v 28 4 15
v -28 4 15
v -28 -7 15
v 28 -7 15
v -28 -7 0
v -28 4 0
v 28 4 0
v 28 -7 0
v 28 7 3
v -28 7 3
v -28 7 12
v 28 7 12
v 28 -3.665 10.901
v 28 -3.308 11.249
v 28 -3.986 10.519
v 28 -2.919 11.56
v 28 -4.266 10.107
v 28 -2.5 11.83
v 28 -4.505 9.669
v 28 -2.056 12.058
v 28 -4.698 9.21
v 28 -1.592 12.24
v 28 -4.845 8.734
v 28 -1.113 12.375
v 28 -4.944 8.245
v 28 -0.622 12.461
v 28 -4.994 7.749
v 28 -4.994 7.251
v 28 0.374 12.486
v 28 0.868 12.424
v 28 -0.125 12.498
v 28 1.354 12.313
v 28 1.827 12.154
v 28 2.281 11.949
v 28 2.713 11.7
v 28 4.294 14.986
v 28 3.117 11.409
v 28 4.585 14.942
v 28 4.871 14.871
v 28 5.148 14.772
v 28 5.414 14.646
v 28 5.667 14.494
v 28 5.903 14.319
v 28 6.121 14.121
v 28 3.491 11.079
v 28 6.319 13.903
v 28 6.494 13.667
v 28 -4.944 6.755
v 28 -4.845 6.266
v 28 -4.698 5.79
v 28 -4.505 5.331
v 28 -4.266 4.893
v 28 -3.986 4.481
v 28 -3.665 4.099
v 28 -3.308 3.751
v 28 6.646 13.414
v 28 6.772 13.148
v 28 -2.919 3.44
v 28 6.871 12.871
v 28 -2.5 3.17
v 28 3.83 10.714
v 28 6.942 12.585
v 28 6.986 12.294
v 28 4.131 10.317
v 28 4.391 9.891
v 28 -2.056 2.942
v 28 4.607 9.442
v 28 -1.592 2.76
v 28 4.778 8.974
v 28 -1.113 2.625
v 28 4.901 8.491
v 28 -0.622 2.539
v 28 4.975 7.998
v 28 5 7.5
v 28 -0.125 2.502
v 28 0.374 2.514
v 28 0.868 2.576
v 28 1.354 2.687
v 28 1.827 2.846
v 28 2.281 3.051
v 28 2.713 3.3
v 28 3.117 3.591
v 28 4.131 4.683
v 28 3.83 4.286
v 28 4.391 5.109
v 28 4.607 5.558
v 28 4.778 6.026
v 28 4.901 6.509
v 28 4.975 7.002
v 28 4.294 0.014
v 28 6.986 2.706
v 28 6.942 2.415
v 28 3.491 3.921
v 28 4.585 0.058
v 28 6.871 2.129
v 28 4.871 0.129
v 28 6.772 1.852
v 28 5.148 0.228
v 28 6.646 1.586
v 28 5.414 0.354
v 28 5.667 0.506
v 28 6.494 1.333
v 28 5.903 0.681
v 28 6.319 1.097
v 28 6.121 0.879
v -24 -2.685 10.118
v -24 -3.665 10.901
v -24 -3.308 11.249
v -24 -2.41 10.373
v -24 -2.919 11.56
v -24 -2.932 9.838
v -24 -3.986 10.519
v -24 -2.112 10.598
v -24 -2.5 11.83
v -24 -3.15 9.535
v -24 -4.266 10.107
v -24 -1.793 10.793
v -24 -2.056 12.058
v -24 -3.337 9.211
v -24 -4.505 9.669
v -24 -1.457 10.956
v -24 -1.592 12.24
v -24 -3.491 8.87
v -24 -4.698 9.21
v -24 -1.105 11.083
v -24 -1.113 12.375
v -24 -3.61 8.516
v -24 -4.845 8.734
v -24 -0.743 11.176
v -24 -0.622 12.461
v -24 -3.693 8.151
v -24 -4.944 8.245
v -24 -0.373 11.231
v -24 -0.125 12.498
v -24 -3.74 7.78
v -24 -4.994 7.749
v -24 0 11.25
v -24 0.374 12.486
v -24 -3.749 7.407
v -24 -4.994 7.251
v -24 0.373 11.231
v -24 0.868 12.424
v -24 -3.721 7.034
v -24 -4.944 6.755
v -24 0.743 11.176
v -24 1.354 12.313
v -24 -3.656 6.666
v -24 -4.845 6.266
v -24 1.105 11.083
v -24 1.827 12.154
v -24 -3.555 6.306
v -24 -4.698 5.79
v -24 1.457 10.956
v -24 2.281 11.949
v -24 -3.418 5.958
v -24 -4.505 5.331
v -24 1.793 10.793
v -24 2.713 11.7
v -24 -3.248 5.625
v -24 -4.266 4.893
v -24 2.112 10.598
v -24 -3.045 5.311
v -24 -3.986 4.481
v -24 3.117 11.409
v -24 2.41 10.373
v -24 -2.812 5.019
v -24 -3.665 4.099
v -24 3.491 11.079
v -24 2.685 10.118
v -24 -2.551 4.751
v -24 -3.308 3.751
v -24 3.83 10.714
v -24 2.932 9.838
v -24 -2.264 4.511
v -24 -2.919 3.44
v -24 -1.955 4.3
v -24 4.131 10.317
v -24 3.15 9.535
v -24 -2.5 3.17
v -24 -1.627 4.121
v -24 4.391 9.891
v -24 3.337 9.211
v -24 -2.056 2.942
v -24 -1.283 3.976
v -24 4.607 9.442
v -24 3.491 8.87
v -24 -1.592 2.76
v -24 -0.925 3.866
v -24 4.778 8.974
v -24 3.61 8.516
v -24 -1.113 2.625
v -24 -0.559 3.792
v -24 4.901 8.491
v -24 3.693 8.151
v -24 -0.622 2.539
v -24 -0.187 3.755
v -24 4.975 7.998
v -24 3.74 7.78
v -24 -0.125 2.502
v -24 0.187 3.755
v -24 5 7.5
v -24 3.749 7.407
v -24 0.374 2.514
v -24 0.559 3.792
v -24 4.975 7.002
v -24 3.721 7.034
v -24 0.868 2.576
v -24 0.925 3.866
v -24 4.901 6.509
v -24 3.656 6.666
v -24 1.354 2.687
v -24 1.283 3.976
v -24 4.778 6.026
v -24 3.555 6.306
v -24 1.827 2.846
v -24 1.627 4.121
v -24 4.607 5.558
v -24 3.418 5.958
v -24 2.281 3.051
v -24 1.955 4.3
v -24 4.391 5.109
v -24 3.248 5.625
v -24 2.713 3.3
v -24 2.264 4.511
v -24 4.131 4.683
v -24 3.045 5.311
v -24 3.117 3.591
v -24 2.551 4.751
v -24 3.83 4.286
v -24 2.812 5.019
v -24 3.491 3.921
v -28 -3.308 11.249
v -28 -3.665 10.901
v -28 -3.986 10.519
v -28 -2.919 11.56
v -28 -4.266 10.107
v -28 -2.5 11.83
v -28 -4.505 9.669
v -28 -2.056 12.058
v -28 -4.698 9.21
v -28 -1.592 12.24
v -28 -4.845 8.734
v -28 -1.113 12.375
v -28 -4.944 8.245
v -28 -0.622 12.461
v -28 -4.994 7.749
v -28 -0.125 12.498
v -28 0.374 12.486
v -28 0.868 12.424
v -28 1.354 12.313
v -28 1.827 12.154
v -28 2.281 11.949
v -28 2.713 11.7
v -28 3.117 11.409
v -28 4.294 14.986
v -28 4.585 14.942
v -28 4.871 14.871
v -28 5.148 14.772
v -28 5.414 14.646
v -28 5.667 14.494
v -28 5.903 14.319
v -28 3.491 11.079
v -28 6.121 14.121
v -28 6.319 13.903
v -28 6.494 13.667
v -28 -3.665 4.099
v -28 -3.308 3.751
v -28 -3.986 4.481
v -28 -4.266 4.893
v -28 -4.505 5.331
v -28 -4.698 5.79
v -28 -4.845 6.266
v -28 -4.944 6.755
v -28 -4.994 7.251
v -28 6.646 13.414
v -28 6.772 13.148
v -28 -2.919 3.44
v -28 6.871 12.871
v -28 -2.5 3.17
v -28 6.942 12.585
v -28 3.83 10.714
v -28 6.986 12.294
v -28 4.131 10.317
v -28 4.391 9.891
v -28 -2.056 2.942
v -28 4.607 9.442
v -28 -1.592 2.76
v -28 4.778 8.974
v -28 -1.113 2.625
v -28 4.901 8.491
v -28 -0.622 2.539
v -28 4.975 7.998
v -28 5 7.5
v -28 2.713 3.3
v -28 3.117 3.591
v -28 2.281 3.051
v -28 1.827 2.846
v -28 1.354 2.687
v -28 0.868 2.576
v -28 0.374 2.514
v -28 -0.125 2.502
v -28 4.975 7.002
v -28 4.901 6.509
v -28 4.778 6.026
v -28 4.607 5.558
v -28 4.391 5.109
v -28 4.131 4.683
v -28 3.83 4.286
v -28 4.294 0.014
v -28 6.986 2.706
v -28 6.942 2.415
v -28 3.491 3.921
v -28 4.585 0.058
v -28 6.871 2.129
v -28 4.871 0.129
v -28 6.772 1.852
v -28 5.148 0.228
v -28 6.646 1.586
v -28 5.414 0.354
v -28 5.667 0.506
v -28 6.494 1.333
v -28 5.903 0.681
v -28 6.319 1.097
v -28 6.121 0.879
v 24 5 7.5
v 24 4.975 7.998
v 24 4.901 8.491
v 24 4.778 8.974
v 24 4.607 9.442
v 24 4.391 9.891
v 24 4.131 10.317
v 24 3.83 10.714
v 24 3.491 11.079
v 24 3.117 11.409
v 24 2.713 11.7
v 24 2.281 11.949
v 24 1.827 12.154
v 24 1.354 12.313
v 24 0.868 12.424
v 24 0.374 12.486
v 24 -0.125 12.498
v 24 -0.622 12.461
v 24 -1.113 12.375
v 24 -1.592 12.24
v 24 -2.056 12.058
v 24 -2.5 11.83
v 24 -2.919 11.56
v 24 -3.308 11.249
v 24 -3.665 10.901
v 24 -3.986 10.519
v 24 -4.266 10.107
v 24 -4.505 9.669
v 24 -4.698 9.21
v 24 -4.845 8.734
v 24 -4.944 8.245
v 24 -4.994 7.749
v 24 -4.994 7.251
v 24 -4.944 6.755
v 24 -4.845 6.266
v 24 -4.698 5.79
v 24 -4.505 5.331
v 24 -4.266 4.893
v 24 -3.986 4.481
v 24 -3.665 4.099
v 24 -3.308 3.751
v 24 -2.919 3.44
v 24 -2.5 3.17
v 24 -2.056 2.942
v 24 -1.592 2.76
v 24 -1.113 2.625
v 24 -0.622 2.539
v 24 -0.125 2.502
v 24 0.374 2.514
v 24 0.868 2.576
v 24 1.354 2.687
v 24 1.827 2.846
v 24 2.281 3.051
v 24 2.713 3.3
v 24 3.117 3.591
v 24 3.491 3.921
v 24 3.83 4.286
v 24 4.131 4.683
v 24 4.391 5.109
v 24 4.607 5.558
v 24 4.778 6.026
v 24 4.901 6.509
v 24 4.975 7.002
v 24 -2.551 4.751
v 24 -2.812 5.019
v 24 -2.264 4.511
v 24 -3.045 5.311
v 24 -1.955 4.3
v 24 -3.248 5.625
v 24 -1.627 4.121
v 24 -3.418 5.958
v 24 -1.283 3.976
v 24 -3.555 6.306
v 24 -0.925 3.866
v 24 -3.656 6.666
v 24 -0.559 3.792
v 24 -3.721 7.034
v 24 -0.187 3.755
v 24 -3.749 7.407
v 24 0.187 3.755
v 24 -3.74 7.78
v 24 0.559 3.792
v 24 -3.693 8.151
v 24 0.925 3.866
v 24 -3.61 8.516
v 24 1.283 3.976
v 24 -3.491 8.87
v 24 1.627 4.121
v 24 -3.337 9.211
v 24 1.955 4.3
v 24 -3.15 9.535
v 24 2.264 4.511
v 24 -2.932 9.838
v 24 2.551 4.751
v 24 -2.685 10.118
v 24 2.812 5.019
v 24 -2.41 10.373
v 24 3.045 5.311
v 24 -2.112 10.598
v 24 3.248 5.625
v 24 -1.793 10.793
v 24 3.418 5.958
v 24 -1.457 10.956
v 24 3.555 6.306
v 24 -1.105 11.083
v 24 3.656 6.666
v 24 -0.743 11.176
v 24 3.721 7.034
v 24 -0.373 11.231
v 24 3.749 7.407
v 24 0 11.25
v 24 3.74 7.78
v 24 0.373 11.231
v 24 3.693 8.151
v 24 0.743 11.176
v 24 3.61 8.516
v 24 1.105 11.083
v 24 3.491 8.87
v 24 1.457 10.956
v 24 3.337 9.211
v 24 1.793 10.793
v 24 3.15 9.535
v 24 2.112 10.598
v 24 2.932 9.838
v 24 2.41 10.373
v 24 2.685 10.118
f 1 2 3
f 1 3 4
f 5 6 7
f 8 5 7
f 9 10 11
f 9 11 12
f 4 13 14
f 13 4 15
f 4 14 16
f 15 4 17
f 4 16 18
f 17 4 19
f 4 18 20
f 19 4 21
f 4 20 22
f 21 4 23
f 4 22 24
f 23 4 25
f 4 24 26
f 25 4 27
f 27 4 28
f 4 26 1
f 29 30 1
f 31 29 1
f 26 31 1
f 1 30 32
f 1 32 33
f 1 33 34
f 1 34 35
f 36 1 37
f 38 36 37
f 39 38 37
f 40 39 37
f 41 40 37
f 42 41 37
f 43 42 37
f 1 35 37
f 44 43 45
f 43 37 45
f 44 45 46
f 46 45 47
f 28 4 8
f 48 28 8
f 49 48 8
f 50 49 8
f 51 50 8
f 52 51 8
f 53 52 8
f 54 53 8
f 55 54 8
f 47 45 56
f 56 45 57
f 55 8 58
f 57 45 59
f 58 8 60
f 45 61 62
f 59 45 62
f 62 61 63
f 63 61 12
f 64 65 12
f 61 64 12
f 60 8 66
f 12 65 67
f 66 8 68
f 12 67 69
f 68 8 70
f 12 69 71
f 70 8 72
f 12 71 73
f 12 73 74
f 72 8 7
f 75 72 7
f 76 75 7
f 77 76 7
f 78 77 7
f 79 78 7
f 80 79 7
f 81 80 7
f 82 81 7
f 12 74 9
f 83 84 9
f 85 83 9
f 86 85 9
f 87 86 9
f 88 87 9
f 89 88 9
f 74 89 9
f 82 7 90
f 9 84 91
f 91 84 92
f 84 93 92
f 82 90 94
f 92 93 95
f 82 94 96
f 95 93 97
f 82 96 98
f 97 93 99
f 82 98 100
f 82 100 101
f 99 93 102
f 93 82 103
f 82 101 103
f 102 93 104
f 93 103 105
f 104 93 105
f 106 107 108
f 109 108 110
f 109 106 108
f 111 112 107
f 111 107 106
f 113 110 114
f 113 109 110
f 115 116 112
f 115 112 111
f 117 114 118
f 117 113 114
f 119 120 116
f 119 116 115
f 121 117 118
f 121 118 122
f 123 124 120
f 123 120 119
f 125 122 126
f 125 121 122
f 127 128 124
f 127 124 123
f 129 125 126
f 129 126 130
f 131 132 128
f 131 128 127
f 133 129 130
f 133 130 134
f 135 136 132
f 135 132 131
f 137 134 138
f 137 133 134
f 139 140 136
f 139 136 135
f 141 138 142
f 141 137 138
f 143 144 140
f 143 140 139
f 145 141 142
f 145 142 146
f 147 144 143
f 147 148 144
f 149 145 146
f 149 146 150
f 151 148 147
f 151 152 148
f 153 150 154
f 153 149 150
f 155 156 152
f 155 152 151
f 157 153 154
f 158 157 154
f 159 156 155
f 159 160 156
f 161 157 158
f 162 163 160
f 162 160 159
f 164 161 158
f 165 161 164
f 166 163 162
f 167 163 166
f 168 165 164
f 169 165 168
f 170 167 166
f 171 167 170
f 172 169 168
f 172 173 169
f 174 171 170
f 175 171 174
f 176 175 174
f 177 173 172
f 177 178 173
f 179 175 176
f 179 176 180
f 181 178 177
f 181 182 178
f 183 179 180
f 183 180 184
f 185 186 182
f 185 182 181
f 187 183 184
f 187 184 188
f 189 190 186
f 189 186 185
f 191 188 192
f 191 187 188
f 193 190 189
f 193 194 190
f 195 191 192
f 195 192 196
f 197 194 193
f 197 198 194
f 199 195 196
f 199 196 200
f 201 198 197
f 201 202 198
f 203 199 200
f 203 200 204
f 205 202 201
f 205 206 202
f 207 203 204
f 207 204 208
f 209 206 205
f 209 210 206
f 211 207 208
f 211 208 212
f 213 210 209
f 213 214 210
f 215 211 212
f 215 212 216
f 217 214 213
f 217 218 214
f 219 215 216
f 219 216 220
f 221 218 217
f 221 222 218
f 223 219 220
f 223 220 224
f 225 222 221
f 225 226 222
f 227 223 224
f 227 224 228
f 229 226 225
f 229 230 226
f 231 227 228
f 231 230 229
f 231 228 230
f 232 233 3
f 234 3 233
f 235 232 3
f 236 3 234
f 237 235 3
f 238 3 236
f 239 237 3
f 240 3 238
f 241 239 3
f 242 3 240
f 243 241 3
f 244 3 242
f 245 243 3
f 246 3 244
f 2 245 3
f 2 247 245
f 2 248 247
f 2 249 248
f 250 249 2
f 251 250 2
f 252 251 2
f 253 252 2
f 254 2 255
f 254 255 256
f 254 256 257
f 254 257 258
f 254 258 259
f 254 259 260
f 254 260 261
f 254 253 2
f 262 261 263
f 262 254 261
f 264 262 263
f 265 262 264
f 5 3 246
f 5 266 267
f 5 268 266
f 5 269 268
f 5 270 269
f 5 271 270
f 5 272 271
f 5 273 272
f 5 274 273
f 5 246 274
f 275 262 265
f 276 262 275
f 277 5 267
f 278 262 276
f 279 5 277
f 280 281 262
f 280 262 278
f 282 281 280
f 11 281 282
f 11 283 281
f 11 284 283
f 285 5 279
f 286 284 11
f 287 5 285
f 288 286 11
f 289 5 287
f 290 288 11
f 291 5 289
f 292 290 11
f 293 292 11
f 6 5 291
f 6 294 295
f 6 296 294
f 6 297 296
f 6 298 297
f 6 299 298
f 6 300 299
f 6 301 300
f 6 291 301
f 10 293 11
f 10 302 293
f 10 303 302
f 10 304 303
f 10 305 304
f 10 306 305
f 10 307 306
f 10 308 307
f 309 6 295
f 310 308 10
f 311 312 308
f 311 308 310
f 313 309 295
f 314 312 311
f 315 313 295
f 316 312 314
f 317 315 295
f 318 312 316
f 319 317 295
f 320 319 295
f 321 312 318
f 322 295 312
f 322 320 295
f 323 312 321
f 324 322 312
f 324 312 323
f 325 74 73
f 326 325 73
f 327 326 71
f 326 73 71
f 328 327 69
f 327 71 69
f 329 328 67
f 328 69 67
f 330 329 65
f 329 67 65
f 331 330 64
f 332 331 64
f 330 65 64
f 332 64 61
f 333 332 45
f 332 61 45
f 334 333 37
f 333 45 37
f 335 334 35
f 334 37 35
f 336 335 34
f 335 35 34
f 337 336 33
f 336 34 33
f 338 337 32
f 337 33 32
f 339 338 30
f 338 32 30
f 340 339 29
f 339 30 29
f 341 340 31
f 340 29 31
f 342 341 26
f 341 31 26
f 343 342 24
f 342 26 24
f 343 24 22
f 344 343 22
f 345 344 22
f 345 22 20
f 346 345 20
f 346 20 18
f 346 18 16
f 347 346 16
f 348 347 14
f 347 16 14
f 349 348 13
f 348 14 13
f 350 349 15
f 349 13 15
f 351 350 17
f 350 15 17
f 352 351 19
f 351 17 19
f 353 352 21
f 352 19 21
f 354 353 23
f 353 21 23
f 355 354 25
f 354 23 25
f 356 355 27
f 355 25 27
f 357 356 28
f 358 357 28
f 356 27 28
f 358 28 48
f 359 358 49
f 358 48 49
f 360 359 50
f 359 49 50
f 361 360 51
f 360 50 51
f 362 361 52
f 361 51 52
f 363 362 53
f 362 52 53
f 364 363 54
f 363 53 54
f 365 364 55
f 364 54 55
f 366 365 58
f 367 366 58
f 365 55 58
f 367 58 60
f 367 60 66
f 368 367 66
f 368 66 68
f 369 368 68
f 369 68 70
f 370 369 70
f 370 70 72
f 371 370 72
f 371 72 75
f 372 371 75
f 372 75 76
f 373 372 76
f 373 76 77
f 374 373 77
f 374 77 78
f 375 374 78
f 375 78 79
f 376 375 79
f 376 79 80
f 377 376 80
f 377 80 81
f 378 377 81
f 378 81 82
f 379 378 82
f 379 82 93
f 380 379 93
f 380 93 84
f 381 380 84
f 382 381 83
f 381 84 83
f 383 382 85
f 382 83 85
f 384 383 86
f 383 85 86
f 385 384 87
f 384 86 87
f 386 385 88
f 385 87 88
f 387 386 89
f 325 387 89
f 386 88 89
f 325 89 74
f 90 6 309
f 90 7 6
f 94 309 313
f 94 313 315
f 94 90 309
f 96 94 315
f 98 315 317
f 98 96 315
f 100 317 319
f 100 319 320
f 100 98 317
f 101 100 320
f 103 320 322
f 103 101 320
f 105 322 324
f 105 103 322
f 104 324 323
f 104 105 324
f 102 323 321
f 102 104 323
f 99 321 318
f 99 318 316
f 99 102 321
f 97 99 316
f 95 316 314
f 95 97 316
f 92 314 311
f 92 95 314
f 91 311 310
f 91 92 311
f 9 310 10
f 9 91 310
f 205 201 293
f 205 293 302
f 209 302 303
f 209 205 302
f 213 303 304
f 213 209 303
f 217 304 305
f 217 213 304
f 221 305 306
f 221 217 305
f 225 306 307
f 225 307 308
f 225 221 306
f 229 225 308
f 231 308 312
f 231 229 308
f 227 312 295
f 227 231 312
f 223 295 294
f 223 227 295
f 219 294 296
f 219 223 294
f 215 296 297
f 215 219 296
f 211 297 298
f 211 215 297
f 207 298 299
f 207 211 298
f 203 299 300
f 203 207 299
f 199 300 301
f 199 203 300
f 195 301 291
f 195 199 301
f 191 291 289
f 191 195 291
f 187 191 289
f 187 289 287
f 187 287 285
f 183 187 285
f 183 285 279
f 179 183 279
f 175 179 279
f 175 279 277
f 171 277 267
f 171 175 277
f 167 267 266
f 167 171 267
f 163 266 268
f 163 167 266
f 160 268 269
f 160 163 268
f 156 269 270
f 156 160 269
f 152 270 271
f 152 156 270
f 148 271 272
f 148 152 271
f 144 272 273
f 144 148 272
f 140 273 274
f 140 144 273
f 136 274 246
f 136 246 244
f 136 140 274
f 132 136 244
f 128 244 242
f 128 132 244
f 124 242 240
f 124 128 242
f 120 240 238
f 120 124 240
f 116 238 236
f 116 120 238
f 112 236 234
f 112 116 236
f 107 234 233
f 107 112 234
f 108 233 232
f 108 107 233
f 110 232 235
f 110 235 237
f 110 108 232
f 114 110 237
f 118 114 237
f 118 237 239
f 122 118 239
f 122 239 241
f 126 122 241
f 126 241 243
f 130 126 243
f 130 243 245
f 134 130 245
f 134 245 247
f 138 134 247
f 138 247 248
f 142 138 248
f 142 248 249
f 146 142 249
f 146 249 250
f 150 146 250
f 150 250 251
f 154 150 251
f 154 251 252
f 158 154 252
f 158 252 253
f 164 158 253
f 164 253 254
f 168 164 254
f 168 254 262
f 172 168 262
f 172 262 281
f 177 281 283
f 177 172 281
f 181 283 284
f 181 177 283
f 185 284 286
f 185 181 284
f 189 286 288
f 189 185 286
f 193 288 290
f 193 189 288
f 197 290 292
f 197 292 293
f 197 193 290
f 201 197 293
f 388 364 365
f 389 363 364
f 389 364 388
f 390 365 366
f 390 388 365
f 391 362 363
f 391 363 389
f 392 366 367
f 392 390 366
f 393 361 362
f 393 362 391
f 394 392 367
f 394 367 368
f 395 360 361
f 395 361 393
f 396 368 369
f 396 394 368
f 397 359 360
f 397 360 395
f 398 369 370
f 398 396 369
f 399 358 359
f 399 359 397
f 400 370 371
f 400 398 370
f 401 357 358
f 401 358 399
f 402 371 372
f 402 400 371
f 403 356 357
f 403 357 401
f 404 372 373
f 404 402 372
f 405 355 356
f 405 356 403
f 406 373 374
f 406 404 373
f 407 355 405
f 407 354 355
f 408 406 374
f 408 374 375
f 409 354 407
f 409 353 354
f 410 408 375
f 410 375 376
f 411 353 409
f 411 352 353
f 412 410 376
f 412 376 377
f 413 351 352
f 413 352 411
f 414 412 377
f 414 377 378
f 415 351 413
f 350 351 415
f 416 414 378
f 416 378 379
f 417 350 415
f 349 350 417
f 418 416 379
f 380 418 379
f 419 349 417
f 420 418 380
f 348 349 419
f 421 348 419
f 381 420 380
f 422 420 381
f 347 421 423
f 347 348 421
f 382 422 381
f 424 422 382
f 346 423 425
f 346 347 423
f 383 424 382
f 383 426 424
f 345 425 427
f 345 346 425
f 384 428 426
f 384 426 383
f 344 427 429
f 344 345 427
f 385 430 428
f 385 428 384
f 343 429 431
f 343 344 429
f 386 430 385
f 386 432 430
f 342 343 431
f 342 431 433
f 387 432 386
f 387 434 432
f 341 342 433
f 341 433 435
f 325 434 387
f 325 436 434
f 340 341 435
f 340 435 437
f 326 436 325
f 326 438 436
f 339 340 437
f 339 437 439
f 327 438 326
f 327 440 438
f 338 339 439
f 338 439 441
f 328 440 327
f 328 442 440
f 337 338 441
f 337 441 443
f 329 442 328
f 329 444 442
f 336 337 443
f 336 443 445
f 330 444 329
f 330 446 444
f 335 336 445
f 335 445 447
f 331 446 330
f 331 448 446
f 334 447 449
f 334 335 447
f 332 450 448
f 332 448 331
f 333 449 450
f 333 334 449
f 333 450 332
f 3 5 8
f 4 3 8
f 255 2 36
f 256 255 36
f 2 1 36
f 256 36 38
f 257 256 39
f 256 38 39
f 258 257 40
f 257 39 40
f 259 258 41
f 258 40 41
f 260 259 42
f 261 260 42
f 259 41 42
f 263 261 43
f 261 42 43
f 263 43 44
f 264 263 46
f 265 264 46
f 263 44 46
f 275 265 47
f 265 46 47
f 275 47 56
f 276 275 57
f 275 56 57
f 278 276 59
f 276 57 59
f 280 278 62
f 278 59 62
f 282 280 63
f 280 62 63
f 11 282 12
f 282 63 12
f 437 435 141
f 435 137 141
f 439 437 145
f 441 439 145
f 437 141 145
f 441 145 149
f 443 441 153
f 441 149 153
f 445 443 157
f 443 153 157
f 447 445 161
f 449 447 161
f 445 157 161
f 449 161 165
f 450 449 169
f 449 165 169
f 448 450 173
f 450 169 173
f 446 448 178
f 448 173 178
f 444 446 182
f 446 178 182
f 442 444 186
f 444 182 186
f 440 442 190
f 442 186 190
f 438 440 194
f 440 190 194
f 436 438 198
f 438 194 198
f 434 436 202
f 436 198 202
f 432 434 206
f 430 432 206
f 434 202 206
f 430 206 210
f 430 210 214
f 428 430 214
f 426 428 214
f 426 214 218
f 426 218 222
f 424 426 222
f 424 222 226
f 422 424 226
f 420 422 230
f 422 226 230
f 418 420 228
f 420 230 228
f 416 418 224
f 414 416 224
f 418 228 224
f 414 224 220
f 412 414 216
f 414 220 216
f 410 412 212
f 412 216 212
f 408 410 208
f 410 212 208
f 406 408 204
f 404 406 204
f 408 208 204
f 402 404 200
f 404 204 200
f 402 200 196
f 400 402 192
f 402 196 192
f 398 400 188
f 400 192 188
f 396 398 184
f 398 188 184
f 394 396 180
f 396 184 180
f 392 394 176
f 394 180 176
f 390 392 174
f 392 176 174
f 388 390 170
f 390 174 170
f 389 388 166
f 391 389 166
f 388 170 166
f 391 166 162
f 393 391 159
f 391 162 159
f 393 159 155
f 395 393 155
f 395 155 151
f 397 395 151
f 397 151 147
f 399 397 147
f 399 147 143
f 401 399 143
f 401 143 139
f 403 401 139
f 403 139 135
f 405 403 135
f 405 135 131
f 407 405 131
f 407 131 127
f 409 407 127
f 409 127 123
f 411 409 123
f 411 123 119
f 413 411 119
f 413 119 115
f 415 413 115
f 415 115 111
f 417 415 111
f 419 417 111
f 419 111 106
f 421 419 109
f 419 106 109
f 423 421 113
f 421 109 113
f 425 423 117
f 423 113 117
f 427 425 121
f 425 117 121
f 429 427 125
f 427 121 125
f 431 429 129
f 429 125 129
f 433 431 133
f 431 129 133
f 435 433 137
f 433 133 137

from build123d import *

# Parameters (mm, degrees)
SKETCH1_W                = 56
SKETCH1_H                = 14
BOSS_EXTRUDE1_DEPTH      = 15
F_3_0_3_DIAMETER_HOLE1_D = 7.5
SKETCH5_R                = 5
CUT_EXTRUDE1_DEPTH       = 4
CUT_EXTRUDE2_START       = -4
SKETCH6_R                = 5
CUT_EXTRUDE2_DEPTH       = 4
FILLET1_R                = 3


with BuildPart() as part:
    # Sketch1 → Boss-Extrude1 (new body)
    with BuildSketch(Plane.XY):
        Rectangle(SKETCH1_W, SKETCH1_H)
    extrude(amount=BOSS_EXTRUDE1_DEPTH)

    # Ø3.0 (3) Diameter Hole1 (through all)
    with Locations(Plane(origin=(28, 0, 0), x_dir=(0, 0, -1), z_dir=(1, 0, 0))):
        with Locations((-7.5, 0)):
            Hole(F_3_0_3_DIAMETER_HOLE1_D / 2)

    # Sketch5 → Cut-Extrude1 (cut)
    with BuildSketch(Plane(origin=(28, 0, 0), x_dir=(0, 0, -1), z_dir=(1, 0, 0))):
        with Locations(Location((-7.5, 0, 0), (0, 0, 90))):
            Circle(SKETCH5_R)
    extrude(amount=-CUT_EXTRUDE1_DEPTH, mode=Mode.SUBTRACT)

    # Sketch6 → Cut-Extrude2 (cut)
    with BuildSketch(Plane.ZY.offset(28).offset(CUT_EXTRUDE2_START)):
        with Locations(Location((7.5, 0, 0), (0, 0, 90))):
            Circle(SKETCH6_R)
    extrude(amount=CUT_EXTRUDE2_DEPTH, mode=Mode.SUBTRACT)

    # Fillet1
    fillet1_edges = [part.edges().sort_by_distance(p)[0] for p in [
        (0, 7, 15),
        (0, 7, 0),
    ]]
    fillet(fillet1_edges, radius=FILLET1_R)


solid = part.part
